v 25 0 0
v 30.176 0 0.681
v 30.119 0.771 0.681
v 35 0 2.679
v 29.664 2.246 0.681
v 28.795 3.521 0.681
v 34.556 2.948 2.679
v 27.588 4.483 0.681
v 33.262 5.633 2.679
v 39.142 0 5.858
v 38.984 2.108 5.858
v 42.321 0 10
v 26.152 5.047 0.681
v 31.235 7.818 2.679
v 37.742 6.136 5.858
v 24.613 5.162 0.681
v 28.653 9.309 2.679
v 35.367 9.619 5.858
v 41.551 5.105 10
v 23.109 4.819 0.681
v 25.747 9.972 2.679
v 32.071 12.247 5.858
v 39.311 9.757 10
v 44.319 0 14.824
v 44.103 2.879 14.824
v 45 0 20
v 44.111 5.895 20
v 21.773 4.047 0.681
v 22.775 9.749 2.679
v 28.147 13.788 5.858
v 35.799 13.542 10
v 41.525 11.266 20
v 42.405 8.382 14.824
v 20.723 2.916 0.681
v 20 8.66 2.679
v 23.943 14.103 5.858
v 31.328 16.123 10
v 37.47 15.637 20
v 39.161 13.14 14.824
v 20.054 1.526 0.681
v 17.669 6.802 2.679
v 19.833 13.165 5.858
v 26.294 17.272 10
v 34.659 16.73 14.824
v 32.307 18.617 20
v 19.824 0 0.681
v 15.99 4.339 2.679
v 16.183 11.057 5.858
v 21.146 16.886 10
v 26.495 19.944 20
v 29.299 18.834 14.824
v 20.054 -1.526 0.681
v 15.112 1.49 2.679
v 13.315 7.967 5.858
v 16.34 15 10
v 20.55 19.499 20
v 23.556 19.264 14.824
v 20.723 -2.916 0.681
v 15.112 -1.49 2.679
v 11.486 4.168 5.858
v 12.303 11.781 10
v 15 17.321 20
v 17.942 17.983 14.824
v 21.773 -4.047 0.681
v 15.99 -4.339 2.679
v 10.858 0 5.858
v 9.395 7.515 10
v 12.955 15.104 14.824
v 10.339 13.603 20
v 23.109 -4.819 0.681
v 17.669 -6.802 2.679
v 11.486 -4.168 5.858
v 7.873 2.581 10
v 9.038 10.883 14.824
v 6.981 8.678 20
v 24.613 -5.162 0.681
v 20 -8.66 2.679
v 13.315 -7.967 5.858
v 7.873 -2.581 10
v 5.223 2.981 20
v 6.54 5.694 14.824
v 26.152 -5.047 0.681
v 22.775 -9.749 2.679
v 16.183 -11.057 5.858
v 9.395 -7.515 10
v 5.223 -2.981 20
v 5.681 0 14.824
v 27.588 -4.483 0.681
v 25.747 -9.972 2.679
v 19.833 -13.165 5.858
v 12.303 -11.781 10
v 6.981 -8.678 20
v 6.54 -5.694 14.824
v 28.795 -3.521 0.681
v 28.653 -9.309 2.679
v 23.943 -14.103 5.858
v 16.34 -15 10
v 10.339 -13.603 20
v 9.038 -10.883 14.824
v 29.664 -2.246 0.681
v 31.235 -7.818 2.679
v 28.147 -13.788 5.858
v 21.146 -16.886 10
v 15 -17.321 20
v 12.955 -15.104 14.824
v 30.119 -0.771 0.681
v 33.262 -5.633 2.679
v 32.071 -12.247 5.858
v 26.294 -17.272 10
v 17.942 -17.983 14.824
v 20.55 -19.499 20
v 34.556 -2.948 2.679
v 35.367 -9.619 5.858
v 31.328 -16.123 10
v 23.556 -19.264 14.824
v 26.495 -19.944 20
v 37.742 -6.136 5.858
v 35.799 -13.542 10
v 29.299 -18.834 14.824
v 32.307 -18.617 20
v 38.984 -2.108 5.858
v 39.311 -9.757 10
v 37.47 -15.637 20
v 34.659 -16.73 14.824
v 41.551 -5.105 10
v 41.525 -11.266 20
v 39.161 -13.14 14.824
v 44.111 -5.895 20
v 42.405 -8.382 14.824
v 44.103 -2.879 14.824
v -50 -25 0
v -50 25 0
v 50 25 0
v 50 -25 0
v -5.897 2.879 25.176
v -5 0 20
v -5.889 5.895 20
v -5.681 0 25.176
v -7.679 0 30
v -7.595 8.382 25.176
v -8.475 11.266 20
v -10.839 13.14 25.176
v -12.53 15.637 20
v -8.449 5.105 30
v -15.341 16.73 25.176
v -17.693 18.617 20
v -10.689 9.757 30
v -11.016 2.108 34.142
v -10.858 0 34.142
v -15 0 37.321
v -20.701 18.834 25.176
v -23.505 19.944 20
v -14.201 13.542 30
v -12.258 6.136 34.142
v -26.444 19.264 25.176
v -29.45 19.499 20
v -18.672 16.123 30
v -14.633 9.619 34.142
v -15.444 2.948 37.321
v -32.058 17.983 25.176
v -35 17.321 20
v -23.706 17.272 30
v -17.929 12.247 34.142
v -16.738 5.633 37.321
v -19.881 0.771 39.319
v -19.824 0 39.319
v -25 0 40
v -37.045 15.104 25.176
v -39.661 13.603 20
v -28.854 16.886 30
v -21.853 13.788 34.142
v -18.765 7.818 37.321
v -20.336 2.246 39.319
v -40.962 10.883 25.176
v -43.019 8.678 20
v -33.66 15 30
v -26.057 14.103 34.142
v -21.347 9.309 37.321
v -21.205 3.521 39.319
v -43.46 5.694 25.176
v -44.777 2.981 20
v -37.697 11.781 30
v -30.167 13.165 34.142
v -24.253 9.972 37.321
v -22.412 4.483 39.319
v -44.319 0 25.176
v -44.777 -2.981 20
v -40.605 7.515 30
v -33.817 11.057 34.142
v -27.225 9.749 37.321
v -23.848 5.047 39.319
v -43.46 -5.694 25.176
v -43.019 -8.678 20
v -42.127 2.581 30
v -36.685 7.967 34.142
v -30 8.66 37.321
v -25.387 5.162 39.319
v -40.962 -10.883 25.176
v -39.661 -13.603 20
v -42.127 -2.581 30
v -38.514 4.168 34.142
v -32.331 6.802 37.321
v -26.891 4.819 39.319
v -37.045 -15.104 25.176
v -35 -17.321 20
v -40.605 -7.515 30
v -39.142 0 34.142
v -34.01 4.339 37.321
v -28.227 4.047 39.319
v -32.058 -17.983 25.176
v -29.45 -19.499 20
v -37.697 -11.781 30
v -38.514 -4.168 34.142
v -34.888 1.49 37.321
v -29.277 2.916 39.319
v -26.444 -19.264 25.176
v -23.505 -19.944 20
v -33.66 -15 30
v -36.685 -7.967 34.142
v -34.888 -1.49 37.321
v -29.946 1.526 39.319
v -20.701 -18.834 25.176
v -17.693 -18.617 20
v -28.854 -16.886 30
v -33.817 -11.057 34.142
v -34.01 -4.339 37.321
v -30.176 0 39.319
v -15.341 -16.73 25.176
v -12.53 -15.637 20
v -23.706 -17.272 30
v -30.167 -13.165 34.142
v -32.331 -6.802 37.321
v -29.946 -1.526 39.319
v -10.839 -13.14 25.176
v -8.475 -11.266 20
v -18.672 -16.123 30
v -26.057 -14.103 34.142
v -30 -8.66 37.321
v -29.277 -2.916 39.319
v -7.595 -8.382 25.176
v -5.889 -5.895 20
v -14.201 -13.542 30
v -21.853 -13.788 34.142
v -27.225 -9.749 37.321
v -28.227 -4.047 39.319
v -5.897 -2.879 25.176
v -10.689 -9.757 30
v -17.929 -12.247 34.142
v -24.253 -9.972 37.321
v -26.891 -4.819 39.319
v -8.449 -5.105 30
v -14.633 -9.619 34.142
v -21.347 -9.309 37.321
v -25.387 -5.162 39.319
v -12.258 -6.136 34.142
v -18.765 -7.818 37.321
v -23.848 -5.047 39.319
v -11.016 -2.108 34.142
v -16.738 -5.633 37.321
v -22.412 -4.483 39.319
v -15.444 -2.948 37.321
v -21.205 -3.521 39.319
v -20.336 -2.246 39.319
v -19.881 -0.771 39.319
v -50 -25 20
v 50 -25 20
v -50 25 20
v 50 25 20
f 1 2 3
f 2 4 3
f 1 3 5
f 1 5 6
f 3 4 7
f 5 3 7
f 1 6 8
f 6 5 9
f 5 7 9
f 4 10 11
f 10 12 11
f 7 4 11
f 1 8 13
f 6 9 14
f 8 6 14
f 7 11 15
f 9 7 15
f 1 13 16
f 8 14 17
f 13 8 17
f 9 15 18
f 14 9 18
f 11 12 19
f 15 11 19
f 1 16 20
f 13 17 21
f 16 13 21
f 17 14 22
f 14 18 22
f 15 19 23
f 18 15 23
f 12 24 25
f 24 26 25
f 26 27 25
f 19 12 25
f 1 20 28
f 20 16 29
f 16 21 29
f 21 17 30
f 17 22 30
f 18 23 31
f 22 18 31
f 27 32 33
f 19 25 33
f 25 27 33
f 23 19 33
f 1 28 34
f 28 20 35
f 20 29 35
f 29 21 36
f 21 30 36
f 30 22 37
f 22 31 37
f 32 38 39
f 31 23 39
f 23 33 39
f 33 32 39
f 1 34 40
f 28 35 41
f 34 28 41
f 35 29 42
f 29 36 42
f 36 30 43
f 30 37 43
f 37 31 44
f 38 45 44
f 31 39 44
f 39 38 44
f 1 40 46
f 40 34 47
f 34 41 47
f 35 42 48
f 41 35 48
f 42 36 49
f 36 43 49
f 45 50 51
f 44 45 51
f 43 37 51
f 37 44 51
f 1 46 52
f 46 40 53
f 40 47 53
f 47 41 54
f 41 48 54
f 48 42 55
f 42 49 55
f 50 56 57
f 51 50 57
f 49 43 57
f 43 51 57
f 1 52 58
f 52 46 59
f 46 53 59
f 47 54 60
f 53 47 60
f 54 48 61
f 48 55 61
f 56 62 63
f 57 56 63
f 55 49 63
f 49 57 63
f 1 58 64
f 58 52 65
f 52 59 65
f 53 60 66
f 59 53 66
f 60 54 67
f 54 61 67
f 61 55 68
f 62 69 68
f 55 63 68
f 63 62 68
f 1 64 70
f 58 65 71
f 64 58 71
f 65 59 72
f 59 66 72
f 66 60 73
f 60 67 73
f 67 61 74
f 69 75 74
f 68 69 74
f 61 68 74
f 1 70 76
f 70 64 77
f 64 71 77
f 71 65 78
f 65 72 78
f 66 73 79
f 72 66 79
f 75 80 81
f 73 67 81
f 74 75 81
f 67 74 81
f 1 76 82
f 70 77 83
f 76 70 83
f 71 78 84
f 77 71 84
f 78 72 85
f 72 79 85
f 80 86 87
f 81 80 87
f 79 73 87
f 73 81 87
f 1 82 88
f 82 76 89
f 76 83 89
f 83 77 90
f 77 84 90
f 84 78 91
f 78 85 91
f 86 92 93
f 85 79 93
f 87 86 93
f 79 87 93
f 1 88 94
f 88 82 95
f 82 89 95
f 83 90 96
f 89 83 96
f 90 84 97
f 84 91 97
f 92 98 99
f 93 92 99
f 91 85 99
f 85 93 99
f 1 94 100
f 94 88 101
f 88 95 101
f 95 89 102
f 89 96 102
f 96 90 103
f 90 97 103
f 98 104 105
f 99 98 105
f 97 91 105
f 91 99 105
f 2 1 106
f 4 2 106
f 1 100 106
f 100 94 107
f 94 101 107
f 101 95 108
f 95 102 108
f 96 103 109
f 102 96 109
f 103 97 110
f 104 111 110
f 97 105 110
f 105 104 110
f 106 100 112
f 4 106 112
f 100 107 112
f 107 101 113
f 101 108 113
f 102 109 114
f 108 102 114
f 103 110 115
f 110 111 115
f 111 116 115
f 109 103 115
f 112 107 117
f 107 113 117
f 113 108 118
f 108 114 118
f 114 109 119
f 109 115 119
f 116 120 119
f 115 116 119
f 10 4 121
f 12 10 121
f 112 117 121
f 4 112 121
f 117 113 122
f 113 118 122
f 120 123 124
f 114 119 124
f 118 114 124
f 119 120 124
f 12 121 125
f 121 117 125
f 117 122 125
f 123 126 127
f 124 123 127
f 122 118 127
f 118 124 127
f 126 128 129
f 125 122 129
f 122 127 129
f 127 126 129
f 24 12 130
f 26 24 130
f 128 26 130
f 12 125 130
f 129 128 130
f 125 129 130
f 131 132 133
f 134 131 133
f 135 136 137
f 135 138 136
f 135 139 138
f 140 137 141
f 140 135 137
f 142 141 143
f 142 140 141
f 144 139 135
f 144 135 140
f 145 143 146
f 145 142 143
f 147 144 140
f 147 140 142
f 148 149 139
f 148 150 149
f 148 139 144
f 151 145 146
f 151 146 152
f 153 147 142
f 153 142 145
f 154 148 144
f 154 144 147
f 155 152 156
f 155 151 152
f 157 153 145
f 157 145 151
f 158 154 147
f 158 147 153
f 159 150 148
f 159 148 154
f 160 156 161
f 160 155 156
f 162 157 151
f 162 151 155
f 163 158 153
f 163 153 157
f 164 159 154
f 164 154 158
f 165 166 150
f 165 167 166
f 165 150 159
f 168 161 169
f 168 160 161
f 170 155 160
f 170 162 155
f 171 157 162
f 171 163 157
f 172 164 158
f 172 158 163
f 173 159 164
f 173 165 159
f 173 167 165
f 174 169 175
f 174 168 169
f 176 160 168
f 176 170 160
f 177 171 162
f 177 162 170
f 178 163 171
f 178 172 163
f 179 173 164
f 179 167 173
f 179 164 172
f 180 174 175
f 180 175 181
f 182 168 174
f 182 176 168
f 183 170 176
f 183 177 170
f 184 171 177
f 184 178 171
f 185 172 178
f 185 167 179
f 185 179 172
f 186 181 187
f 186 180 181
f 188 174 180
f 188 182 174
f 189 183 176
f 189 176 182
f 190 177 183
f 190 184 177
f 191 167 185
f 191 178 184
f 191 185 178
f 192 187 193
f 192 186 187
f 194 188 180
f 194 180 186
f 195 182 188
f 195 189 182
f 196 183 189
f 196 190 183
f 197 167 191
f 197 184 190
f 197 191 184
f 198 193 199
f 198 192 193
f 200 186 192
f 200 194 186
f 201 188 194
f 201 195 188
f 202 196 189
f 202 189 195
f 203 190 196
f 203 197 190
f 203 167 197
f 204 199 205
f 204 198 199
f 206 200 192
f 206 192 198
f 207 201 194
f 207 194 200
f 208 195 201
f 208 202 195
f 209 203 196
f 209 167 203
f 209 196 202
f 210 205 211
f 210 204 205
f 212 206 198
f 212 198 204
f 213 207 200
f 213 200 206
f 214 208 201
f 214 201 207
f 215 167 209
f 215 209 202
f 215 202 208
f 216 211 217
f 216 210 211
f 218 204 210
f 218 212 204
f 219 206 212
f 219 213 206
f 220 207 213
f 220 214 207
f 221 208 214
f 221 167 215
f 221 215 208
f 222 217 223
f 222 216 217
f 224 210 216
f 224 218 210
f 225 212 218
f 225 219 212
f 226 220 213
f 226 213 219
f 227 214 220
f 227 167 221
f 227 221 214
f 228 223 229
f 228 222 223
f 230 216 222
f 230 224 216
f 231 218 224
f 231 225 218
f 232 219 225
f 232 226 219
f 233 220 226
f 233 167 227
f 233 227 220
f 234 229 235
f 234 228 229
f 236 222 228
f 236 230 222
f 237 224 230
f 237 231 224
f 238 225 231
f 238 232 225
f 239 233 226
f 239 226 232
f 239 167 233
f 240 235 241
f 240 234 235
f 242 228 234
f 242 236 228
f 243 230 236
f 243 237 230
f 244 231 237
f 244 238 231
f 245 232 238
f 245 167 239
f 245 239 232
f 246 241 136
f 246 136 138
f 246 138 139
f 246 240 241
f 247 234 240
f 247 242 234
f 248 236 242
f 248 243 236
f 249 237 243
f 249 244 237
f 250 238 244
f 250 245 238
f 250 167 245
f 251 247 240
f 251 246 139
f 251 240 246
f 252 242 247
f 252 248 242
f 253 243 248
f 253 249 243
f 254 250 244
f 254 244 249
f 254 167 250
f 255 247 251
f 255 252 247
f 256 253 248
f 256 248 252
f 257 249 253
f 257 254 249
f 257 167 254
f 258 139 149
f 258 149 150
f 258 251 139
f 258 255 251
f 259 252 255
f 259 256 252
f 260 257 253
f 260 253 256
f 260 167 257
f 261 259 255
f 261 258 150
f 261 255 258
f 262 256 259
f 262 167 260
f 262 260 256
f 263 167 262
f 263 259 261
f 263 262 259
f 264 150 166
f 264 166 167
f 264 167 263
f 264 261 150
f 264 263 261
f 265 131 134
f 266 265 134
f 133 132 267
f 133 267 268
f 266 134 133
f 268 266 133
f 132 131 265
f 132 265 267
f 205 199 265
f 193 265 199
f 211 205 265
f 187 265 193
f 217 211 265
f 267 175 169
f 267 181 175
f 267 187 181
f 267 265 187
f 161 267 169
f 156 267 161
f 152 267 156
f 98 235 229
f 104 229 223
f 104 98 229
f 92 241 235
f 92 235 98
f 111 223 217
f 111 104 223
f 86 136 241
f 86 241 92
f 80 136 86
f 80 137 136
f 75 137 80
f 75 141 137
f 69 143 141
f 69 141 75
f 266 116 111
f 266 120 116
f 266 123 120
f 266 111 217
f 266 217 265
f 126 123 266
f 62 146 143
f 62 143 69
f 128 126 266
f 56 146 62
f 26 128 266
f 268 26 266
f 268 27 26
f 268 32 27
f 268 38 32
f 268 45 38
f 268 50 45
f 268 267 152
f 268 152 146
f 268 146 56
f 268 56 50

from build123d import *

# Parameters (mm, degrees)
SKETCH_W  = 100
SKETCH_H  = 50
PAD_DEPTH = 20


with BuildPart() as part:
    # Sketch → Pad (new body)
    with BuildSketch(Plane.XY):
        Rectangle(SKETCH_W, SKETCH_H)
    extrude(amount=PAD_DEPTH)

    # Sphere → Sphere (revolve)
    with BuildSketch(Plane(origin=(-25, 0, 20), x_dir=(1, 0, 0), z_dir=(0, -1, 0))):
        with BuildLine():
            ThreePointArc((0, -20), (20, 0), (0, 20))
            Line((0, 20), (0, -20))
        make_face()
    revolve(axis=Axis((-25, 0, 20), (0, 0, 1)))

    # Sphere001 → Sphere001 (revolve, cut)
    with BuildSketch(Plane(origin=(25, 0, 20), x_dir=(1, 0, 0), z_dir=(0, -1, 0))):
        with BuildLine():
            ThreePointArc((0, -20), (20, 0), (0, 20))
            Line((0, 20), (0, -20))
        make_face()
    revolve(axis=Axis((25, 0, 20), (0, 0, 1)), mode=Mode.SUBTRACT)


solid = part.part
